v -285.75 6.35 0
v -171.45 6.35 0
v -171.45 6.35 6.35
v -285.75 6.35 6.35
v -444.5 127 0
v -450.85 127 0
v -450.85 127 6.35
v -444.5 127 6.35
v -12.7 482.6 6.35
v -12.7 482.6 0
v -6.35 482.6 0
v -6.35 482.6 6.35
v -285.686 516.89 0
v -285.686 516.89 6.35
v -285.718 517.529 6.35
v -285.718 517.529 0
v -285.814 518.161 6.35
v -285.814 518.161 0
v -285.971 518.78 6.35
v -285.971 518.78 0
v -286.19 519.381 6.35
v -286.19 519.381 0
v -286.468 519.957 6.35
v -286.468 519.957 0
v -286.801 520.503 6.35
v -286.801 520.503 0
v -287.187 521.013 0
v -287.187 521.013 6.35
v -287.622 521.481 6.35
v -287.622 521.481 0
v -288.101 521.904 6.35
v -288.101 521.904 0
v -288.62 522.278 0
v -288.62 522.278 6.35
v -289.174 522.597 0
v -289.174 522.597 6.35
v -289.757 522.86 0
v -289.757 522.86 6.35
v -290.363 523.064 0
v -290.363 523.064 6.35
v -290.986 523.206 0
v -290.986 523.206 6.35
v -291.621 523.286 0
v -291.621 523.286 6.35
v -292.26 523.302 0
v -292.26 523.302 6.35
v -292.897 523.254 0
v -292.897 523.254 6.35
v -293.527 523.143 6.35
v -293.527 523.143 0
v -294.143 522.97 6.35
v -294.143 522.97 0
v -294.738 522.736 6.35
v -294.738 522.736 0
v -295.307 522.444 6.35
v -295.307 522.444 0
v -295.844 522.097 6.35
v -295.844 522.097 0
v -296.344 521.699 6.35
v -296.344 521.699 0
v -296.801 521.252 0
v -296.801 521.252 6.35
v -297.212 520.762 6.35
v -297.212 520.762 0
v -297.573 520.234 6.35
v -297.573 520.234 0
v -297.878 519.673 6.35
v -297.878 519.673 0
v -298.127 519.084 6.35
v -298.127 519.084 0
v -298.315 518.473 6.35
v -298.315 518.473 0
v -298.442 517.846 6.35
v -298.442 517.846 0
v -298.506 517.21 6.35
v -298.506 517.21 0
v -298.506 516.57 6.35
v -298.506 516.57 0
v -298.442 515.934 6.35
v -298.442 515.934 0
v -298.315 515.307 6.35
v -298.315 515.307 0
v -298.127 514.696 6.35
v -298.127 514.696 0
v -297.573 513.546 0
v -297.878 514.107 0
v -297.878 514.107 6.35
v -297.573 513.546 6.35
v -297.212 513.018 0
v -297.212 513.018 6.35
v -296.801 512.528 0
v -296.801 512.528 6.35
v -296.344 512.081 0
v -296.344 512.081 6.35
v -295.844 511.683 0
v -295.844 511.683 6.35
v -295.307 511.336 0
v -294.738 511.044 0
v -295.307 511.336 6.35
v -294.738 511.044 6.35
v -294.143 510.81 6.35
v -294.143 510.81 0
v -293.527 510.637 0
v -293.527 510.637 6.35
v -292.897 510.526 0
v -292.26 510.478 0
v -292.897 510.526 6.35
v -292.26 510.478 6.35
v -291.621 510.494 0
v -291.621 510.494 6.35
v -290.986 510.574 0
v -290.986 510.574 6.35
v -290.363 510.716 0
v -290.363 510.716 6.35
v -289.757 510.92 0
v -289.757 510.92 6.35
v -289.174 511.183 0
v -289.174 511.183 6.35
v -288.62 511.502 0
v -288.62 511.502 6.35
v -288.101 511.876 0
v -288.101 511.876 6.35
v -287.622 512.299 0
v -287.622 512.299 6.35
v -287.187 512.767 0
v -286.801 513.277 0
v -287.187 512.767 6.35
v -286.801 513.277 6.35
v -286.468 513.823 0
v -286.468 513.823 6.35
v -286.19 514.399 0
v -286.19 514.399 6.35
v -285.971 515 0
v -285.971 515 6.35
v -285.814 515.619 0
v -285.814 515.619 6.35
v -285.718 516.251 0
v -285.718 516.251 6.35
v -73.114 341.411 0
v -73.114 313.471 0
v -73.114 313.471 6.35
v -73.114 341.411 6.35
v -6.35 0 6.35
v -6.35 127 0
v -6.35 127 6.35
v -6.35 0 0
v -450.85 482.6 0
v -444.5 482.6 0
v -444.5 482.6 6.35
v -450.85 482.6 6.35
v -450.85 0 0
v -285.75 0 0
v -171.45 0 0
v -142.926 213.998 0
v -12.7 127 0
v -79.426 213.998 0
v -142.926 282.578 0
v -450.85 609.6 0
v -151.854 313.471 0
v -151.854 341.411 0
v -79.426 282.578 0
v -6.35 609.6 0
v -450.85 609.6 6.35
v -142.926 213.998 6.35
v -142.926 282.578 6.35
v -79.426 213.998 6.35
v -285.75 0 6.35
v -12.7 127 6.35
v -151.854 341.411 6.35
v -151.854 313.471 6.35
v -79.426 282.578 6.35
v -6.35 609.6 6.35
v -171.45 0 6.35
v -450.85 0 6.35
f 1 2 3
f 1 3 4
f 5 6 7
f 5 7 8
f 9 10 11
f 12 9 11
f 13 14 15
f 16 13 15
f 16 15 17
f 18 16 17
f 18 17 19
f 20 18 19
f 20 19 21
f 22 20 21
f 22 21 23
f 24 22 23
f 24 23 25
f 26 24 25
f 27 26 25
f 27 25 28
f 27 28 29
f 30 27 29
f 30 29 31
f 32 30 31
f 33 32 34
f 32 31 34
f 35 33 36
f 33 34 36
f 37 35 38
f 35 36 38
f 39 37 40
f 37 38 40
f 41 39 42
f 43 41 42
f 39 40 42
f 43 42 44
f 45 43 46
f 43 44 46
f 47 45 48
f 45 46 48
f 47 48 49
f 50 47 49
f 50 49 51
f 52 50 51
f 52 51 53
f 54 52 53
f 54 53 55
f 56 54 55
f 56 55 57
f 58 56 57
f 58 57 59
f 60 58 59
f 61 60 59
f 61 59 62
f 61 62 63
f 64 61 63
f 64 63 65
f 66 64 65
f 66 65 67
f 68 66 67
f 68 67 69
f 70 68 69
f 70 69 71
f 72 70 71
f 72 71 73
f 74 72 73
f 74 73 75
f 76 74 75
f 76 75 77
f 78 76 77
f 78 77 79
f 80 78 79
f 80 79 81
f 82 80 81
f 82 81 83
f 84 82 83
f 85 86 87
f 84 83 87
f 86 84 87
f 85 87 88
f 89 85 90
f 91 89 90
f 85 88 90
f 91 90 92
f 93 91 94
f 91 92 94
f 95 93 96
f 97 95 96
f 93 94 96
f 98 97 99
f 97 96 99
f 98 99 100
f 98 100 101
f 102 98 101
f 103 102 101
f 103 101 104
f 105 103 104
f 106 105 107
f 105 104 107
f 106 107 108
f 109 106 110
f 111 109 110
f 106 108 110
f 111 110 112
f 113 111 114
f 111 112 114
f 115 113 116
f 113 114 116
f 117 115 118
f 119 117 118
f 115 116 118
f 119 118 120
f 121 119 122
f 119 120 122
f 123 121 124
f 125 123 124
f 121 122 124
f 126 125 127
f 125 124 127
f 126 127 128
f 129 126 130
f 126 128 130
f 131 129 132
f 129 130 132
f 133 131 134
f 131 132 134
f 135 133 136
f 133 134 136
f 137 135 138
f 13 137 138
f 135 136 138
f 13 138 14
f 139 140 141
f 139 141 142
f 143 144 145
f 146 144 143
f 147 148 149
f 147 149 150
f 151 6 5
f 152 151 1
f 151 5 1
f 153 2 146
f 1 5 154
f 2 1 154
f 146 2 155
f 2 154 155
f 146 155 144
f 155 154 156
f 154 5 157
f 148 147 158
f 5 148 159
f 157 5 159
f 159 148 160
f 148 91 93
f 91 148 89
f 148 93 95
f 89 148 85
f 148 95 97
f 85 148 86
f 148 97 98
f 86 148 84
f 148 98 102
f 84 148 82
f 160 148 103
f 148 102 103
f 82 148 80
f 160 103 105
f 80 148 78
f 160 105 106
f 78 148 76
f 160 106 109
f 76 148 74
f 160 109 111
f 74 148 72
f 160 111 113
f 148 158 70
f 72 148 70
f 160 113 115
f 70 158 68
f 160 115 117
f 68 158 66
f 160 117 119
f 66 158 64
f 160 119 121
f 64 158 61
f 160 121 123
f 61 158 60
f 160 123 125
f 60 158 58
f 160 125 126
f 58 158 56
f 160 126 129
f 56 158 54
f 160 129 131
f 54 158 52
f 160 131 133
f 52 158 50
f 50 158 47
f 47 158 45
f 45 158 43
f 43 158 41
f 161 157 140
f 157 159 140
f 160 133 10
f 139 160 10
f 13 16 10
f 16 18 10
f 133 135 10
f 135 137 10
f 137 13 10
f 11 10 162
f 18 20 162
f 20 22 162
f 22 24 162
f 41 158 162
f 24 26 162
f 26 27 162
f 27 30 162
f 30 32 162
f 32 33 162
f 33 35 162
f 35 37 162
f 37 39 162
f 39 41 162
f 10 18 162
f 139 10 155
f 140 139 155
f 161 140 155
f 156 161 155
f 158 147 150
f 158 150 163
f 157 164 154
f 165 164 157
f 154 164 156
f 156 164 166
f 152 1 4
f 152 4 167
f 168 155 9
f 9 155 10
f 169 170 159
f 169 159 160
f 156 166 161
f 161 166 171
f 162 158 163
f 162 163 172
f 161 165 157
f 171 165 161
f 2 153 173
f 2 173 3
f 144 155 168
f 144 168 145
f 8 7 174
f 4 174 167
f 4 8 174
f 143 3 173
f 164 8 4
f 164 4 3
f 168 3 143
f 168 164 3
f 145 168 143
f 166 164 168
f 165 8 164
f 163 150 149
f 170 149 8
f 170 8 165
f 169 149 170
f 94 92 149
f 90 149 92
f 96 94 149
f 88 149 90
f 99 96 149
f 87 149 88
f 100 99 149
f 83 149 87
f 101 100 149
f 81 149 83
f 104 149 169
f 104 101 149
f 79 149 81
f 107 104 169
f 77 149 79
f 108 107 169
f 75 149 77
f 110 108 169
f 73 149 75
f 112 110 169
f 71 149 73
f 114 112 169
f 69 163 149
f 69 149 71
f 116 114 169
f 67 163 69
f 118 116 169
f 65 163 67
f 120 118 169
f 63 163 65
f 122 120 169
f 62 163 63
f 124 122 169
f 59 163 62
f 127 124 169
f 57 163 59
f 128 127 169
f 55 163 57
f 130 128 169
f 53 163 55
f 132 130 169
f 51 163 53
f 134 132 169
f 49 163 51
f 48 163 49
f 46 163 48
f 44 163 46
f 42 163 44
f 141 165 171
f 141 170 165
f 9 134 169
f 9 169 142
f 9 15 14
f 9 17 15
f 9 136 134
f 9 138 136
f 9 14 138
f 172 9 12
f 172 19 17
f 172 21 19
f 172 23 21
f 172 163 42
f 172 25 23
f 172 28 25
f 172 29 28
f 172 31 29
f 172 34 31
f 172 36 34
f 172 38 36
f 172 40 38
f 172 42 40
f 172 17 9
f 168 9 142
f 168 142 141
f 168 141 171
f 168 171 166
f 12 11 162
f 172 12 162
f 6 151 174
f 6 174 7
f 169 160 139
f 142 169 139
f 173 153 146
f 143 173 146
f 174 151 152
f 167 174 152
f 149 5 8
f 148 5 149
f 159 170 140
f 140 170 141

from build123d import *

# Parameters (mm, degrees)
SKETCH1_W                = 457.2
SKETCH1_H                = 609.6
BOSS_EXTRUDE2_DEPTH      = 6.35
CUT_EXTRUDE1_REACH       = 764.026
SKETCH2_W                = 63.5
SKETCH2_H                = 68.58
SKETCH3_W                = 73.66
SKETCH3_H                = 27.94
CUT_EXTRUDE2_DEPTH       = 63.5
CUT_EXTRUDE4_DEPTH       = 763.026457874
CUT_EXTRUDE4_DEPTH_BACK  = 763.026457874
SKETCH5_W                = 5.08
SKETCH5_H                = 27.94
CUT_EXTRUDE5_DEPTH       = 763.026457874
CUT_EXTRUDE5_DEPTH_BACK  = 763.026457874
CUT_EXTRUDE6_DEPTH       = 763.026457874
CUT_EXTRUDE6_DEPTH_BACK  = 763.026457874
SKETCH7_W                = 12.7
SKETCH7_H                = 355.6
CUT_EXTRUDE8_START       = -6.35
CUT_EXTRUDE8_OUTLINE_W   = 6.35
CUT_EXTRUDE8_OUTLINE_H   = 127
CUT_EXTRUDE8_DEPTH       = 6.35
CUT_EXTRUDE9_DEPTH       = 763.026457874
CUT_EXTRUDE9_DEPTH_BACK  = 763.026457874
CUT_EXTRUDE10_START      = -6.35
CUT_EXTRUDE10_OUTLINE_W  = 6.35
CUT_EXTRUDE10_OUTLINE_H  = 127
CUT_EXTRUDE10_DEPTH      = 6.35
CUT_EXTRUDE11_DEPTH      = 759.233608461
CUT_EXTRUDE11_DEPTH_BACK = 759.233608461
CUT_EXTRUDE12_DEPTH      = 759.233608461
CUT_EXTRUDE12_DEPTH_BACK = 759.233608461
SKETCH4_R                = 6.4135
CUT_EXTRUDE13_DEPTH      = 759.233608461


# Read off the part's stored shape, not the designer's step: Cut-Extrude8, Cut-Extrude10
with BuildPart() as part:
    # Sketch1 → Boss-Extrude2 (new body)
    with BuildSketch(Plane.XY):
        with Locations((-228.6, 304.8)):
            Rectangle(SKETCH1_W, SKETCH1_H)
    extrude(amount=BOSS_EXTRUDE2_DEPTH)

    # Sketch2 → Cut-Extrude1 (cut, up to next)
    with BuildSketch(Plane.XY.offset(6.35), mode=Mode.PRIVATE) as cut_extrude1_sk1:
        with Locations((-111.175624359, 248.287614127)):
            Rectangle(SKETCH2_W, SKETCH2_H)
    cut_extrude1_tool1 = extrude(cut_extrude1_sk1.sketch, amount=-CUT_EXTRUDE1_REACH, mode=Mode.PRIVATE) & part.part
    add(cut_extrude1_tool1.solids().sort_by_distance((-111.175624, 248.287614, 6.35))[0], mode=Mode.SUBTRACT)

    # Sketch3 → Cut-Extrude2 (cut)
    with BuildSketch(Plane.XY.offset(6.35)):
        with Locations((-115.023623847, 327.440976048)):
            Rectangle(SKETCH3_W, SKETCH3_H)
    extrude(amount=-CUT_EXTRUDE2_DEPTH, mode=Mode.SUBTRACT)

    # Sketch5 → Cut-Extrude4 (cut, two sides: drawn at the far end of the back side and taken through both)
    with BuildSketch(Plane.XY.offset(6.35).offset(-CUT_EXTRUDE4_DEPTH_BACK)):
        with Locations((-75.653623847, 327.440976048)):
            Rectangle(SKETCH5_W, SKETCH5_H)
    extrude(amount=CUT_EXTRUDE4_DEPTH + CUT_EXTRUDE4_DEPTH_BACK, mode=Mode.SUBTRACT)

    # Sketch6 → Cut-Extrude5 (cut, two sides: drawn at the far end of the back side and taken through both)
    with BuildSketch(Plane.XY.offset(6.35).offset(-CUT_EXTRUDE5_DEPTH_BACK)):
        Polygon((-1796.763236556, 127), (-457.2, 127), (-444.5, 127), (-444.5, 482.6), (-457.2, 482.6), (-1796.763236556, 482.6), (-4475.889709667, 482.6), (-4475.889709667, 127), align=None)
    extrude(amount=CUT_EXTRUDE5_DEPTH + CUT_EXTRUDE5_DEPTH_BACK, mode=Mode.SUBTRACT)

    # Sketch7 → Cut-Extrude6 (cut, two sides: drawn at the far end of the back side and taken through both)
    with BuildSketch(Plane.XY.offset(6.35).offset(-CUT_EXTRUDE6_DEPTH_BACK)):
        with Locations((-6.35, 304.8)):
            Rectangle(SKETCH7_W, SKETCH7_H)
    extrude(amount=CUT_EXTRUDE6_DEPTH + CUT_EXTRUDE6_DEPTH_BACK, mode=Mode.SUBTRACT)

    # Cut-Extrude8 outline → Cut-Extrude8 (cut)
    with BuildSketch(Plane.XY.offset(6.35).offset(CUT_EXTRUDE8_START)):
        with Locations((-454.025, 63.5)):
            Rectangle(CUT_EXTRUDE8_OUTLINE_W, CUT_EXTRUDE8_OUTLINE_H)
    extrude(amount=CUT_EXTRUDE8_DEPTH, mode=Mode.SUBTRACT)

    # Sketch13 → Cut-Extrude9 (cut, two sides: drawn at the far end of the back side and taken through both)
    with BuildSketch(Plane.XY.offset(6.35).offset(-CUT_EXTRUDE9_DEPTH_BACK)):
        Polygon((-450.85, 2136.014036469), (-450.85, 609.6), (-450.85, 482.6), (-450.85, -1043.814036469), (-3503.678072938, -1043.814036469), (-3503.678072938, 2136.014036469), align=None)
    extrude(amount=CUT_EXTRUDE9_DEPTH + CUT_EXTRUDE9_DEPTH_BACK, mode=Mode.SUBTRACT)

    # Cut-Extrude10 outline → Cut-Extrude10 (cut)
    with BuildSketch(Plane.XY.offset(6.35).offset(CUT_EXTRUDE10_START)):
        with Locations((-3.175, 546.1)):
            Rectangle(CUT_EXTRUDE10_OUTLINE_W, CUT_EXTRUDE10_OUTLINE_H)
    extrude(amount=CUT_EXTRUDE10_DEPTH, mode=Mode.SUBTRACT)

    # Sketch16 → Cut-Extrude11 (cut, two sides: drawn at the far end of the back side and taken through both)
    with BuildSketch(Plane.XY.offset(6.35).offset(-CUT_EXTRUDE11_DEPTH_BACK)):
        Polygon((-6.35, 1645.896828812), (-6.35, 127), (-6.35, 0), (-6.35, -1518.896828812), (3031.443657625, -1518.896828812), (3031.443657625, 1645.896828812), align=None)
    extrude(amount=CUT_EXTRUDE11_DEPTH + CUT_EXTRUDE11_DEPTH_BACK, mode=Mode.SUBTRACT)

    # Sketch9 → Cut-Extrude12 (cut, two sides: drawn at the far end of the back side and taken through both)
    with BuildSketch(Plane.XY.offset(6.35).offset(-CUT_EXTRUDE12_DEPTH_BACK)):
        Polygon((-171.45, -1351.158484296), (-171.45, 0), (-171.45, 6.35), (-285.75, 6.35), (-285.75, 0), (-285.75, -1351.158484296), (-285.75, -4053.475452889), (-171.45, -4053.475452889), align=None)
    extrude(amount=CUT_EXTRUDE12_DEPTH + CUT_EXTRUDE12_DEPTH_BACK, mode=Mode.SUBTRACT)

    # Sketch4 → Cut-Extrude13 (cut, through all)
    with BuildSketch(Plane.XY.offset(6.35)):
        with Locations((-292.1, 516.89)):
            Circle(SKETCH4_R)
    extrude(amount=-CUT_EXTRUDE13_DEPTH, mode=Mode.SUBTRACT)


solid = part.part
